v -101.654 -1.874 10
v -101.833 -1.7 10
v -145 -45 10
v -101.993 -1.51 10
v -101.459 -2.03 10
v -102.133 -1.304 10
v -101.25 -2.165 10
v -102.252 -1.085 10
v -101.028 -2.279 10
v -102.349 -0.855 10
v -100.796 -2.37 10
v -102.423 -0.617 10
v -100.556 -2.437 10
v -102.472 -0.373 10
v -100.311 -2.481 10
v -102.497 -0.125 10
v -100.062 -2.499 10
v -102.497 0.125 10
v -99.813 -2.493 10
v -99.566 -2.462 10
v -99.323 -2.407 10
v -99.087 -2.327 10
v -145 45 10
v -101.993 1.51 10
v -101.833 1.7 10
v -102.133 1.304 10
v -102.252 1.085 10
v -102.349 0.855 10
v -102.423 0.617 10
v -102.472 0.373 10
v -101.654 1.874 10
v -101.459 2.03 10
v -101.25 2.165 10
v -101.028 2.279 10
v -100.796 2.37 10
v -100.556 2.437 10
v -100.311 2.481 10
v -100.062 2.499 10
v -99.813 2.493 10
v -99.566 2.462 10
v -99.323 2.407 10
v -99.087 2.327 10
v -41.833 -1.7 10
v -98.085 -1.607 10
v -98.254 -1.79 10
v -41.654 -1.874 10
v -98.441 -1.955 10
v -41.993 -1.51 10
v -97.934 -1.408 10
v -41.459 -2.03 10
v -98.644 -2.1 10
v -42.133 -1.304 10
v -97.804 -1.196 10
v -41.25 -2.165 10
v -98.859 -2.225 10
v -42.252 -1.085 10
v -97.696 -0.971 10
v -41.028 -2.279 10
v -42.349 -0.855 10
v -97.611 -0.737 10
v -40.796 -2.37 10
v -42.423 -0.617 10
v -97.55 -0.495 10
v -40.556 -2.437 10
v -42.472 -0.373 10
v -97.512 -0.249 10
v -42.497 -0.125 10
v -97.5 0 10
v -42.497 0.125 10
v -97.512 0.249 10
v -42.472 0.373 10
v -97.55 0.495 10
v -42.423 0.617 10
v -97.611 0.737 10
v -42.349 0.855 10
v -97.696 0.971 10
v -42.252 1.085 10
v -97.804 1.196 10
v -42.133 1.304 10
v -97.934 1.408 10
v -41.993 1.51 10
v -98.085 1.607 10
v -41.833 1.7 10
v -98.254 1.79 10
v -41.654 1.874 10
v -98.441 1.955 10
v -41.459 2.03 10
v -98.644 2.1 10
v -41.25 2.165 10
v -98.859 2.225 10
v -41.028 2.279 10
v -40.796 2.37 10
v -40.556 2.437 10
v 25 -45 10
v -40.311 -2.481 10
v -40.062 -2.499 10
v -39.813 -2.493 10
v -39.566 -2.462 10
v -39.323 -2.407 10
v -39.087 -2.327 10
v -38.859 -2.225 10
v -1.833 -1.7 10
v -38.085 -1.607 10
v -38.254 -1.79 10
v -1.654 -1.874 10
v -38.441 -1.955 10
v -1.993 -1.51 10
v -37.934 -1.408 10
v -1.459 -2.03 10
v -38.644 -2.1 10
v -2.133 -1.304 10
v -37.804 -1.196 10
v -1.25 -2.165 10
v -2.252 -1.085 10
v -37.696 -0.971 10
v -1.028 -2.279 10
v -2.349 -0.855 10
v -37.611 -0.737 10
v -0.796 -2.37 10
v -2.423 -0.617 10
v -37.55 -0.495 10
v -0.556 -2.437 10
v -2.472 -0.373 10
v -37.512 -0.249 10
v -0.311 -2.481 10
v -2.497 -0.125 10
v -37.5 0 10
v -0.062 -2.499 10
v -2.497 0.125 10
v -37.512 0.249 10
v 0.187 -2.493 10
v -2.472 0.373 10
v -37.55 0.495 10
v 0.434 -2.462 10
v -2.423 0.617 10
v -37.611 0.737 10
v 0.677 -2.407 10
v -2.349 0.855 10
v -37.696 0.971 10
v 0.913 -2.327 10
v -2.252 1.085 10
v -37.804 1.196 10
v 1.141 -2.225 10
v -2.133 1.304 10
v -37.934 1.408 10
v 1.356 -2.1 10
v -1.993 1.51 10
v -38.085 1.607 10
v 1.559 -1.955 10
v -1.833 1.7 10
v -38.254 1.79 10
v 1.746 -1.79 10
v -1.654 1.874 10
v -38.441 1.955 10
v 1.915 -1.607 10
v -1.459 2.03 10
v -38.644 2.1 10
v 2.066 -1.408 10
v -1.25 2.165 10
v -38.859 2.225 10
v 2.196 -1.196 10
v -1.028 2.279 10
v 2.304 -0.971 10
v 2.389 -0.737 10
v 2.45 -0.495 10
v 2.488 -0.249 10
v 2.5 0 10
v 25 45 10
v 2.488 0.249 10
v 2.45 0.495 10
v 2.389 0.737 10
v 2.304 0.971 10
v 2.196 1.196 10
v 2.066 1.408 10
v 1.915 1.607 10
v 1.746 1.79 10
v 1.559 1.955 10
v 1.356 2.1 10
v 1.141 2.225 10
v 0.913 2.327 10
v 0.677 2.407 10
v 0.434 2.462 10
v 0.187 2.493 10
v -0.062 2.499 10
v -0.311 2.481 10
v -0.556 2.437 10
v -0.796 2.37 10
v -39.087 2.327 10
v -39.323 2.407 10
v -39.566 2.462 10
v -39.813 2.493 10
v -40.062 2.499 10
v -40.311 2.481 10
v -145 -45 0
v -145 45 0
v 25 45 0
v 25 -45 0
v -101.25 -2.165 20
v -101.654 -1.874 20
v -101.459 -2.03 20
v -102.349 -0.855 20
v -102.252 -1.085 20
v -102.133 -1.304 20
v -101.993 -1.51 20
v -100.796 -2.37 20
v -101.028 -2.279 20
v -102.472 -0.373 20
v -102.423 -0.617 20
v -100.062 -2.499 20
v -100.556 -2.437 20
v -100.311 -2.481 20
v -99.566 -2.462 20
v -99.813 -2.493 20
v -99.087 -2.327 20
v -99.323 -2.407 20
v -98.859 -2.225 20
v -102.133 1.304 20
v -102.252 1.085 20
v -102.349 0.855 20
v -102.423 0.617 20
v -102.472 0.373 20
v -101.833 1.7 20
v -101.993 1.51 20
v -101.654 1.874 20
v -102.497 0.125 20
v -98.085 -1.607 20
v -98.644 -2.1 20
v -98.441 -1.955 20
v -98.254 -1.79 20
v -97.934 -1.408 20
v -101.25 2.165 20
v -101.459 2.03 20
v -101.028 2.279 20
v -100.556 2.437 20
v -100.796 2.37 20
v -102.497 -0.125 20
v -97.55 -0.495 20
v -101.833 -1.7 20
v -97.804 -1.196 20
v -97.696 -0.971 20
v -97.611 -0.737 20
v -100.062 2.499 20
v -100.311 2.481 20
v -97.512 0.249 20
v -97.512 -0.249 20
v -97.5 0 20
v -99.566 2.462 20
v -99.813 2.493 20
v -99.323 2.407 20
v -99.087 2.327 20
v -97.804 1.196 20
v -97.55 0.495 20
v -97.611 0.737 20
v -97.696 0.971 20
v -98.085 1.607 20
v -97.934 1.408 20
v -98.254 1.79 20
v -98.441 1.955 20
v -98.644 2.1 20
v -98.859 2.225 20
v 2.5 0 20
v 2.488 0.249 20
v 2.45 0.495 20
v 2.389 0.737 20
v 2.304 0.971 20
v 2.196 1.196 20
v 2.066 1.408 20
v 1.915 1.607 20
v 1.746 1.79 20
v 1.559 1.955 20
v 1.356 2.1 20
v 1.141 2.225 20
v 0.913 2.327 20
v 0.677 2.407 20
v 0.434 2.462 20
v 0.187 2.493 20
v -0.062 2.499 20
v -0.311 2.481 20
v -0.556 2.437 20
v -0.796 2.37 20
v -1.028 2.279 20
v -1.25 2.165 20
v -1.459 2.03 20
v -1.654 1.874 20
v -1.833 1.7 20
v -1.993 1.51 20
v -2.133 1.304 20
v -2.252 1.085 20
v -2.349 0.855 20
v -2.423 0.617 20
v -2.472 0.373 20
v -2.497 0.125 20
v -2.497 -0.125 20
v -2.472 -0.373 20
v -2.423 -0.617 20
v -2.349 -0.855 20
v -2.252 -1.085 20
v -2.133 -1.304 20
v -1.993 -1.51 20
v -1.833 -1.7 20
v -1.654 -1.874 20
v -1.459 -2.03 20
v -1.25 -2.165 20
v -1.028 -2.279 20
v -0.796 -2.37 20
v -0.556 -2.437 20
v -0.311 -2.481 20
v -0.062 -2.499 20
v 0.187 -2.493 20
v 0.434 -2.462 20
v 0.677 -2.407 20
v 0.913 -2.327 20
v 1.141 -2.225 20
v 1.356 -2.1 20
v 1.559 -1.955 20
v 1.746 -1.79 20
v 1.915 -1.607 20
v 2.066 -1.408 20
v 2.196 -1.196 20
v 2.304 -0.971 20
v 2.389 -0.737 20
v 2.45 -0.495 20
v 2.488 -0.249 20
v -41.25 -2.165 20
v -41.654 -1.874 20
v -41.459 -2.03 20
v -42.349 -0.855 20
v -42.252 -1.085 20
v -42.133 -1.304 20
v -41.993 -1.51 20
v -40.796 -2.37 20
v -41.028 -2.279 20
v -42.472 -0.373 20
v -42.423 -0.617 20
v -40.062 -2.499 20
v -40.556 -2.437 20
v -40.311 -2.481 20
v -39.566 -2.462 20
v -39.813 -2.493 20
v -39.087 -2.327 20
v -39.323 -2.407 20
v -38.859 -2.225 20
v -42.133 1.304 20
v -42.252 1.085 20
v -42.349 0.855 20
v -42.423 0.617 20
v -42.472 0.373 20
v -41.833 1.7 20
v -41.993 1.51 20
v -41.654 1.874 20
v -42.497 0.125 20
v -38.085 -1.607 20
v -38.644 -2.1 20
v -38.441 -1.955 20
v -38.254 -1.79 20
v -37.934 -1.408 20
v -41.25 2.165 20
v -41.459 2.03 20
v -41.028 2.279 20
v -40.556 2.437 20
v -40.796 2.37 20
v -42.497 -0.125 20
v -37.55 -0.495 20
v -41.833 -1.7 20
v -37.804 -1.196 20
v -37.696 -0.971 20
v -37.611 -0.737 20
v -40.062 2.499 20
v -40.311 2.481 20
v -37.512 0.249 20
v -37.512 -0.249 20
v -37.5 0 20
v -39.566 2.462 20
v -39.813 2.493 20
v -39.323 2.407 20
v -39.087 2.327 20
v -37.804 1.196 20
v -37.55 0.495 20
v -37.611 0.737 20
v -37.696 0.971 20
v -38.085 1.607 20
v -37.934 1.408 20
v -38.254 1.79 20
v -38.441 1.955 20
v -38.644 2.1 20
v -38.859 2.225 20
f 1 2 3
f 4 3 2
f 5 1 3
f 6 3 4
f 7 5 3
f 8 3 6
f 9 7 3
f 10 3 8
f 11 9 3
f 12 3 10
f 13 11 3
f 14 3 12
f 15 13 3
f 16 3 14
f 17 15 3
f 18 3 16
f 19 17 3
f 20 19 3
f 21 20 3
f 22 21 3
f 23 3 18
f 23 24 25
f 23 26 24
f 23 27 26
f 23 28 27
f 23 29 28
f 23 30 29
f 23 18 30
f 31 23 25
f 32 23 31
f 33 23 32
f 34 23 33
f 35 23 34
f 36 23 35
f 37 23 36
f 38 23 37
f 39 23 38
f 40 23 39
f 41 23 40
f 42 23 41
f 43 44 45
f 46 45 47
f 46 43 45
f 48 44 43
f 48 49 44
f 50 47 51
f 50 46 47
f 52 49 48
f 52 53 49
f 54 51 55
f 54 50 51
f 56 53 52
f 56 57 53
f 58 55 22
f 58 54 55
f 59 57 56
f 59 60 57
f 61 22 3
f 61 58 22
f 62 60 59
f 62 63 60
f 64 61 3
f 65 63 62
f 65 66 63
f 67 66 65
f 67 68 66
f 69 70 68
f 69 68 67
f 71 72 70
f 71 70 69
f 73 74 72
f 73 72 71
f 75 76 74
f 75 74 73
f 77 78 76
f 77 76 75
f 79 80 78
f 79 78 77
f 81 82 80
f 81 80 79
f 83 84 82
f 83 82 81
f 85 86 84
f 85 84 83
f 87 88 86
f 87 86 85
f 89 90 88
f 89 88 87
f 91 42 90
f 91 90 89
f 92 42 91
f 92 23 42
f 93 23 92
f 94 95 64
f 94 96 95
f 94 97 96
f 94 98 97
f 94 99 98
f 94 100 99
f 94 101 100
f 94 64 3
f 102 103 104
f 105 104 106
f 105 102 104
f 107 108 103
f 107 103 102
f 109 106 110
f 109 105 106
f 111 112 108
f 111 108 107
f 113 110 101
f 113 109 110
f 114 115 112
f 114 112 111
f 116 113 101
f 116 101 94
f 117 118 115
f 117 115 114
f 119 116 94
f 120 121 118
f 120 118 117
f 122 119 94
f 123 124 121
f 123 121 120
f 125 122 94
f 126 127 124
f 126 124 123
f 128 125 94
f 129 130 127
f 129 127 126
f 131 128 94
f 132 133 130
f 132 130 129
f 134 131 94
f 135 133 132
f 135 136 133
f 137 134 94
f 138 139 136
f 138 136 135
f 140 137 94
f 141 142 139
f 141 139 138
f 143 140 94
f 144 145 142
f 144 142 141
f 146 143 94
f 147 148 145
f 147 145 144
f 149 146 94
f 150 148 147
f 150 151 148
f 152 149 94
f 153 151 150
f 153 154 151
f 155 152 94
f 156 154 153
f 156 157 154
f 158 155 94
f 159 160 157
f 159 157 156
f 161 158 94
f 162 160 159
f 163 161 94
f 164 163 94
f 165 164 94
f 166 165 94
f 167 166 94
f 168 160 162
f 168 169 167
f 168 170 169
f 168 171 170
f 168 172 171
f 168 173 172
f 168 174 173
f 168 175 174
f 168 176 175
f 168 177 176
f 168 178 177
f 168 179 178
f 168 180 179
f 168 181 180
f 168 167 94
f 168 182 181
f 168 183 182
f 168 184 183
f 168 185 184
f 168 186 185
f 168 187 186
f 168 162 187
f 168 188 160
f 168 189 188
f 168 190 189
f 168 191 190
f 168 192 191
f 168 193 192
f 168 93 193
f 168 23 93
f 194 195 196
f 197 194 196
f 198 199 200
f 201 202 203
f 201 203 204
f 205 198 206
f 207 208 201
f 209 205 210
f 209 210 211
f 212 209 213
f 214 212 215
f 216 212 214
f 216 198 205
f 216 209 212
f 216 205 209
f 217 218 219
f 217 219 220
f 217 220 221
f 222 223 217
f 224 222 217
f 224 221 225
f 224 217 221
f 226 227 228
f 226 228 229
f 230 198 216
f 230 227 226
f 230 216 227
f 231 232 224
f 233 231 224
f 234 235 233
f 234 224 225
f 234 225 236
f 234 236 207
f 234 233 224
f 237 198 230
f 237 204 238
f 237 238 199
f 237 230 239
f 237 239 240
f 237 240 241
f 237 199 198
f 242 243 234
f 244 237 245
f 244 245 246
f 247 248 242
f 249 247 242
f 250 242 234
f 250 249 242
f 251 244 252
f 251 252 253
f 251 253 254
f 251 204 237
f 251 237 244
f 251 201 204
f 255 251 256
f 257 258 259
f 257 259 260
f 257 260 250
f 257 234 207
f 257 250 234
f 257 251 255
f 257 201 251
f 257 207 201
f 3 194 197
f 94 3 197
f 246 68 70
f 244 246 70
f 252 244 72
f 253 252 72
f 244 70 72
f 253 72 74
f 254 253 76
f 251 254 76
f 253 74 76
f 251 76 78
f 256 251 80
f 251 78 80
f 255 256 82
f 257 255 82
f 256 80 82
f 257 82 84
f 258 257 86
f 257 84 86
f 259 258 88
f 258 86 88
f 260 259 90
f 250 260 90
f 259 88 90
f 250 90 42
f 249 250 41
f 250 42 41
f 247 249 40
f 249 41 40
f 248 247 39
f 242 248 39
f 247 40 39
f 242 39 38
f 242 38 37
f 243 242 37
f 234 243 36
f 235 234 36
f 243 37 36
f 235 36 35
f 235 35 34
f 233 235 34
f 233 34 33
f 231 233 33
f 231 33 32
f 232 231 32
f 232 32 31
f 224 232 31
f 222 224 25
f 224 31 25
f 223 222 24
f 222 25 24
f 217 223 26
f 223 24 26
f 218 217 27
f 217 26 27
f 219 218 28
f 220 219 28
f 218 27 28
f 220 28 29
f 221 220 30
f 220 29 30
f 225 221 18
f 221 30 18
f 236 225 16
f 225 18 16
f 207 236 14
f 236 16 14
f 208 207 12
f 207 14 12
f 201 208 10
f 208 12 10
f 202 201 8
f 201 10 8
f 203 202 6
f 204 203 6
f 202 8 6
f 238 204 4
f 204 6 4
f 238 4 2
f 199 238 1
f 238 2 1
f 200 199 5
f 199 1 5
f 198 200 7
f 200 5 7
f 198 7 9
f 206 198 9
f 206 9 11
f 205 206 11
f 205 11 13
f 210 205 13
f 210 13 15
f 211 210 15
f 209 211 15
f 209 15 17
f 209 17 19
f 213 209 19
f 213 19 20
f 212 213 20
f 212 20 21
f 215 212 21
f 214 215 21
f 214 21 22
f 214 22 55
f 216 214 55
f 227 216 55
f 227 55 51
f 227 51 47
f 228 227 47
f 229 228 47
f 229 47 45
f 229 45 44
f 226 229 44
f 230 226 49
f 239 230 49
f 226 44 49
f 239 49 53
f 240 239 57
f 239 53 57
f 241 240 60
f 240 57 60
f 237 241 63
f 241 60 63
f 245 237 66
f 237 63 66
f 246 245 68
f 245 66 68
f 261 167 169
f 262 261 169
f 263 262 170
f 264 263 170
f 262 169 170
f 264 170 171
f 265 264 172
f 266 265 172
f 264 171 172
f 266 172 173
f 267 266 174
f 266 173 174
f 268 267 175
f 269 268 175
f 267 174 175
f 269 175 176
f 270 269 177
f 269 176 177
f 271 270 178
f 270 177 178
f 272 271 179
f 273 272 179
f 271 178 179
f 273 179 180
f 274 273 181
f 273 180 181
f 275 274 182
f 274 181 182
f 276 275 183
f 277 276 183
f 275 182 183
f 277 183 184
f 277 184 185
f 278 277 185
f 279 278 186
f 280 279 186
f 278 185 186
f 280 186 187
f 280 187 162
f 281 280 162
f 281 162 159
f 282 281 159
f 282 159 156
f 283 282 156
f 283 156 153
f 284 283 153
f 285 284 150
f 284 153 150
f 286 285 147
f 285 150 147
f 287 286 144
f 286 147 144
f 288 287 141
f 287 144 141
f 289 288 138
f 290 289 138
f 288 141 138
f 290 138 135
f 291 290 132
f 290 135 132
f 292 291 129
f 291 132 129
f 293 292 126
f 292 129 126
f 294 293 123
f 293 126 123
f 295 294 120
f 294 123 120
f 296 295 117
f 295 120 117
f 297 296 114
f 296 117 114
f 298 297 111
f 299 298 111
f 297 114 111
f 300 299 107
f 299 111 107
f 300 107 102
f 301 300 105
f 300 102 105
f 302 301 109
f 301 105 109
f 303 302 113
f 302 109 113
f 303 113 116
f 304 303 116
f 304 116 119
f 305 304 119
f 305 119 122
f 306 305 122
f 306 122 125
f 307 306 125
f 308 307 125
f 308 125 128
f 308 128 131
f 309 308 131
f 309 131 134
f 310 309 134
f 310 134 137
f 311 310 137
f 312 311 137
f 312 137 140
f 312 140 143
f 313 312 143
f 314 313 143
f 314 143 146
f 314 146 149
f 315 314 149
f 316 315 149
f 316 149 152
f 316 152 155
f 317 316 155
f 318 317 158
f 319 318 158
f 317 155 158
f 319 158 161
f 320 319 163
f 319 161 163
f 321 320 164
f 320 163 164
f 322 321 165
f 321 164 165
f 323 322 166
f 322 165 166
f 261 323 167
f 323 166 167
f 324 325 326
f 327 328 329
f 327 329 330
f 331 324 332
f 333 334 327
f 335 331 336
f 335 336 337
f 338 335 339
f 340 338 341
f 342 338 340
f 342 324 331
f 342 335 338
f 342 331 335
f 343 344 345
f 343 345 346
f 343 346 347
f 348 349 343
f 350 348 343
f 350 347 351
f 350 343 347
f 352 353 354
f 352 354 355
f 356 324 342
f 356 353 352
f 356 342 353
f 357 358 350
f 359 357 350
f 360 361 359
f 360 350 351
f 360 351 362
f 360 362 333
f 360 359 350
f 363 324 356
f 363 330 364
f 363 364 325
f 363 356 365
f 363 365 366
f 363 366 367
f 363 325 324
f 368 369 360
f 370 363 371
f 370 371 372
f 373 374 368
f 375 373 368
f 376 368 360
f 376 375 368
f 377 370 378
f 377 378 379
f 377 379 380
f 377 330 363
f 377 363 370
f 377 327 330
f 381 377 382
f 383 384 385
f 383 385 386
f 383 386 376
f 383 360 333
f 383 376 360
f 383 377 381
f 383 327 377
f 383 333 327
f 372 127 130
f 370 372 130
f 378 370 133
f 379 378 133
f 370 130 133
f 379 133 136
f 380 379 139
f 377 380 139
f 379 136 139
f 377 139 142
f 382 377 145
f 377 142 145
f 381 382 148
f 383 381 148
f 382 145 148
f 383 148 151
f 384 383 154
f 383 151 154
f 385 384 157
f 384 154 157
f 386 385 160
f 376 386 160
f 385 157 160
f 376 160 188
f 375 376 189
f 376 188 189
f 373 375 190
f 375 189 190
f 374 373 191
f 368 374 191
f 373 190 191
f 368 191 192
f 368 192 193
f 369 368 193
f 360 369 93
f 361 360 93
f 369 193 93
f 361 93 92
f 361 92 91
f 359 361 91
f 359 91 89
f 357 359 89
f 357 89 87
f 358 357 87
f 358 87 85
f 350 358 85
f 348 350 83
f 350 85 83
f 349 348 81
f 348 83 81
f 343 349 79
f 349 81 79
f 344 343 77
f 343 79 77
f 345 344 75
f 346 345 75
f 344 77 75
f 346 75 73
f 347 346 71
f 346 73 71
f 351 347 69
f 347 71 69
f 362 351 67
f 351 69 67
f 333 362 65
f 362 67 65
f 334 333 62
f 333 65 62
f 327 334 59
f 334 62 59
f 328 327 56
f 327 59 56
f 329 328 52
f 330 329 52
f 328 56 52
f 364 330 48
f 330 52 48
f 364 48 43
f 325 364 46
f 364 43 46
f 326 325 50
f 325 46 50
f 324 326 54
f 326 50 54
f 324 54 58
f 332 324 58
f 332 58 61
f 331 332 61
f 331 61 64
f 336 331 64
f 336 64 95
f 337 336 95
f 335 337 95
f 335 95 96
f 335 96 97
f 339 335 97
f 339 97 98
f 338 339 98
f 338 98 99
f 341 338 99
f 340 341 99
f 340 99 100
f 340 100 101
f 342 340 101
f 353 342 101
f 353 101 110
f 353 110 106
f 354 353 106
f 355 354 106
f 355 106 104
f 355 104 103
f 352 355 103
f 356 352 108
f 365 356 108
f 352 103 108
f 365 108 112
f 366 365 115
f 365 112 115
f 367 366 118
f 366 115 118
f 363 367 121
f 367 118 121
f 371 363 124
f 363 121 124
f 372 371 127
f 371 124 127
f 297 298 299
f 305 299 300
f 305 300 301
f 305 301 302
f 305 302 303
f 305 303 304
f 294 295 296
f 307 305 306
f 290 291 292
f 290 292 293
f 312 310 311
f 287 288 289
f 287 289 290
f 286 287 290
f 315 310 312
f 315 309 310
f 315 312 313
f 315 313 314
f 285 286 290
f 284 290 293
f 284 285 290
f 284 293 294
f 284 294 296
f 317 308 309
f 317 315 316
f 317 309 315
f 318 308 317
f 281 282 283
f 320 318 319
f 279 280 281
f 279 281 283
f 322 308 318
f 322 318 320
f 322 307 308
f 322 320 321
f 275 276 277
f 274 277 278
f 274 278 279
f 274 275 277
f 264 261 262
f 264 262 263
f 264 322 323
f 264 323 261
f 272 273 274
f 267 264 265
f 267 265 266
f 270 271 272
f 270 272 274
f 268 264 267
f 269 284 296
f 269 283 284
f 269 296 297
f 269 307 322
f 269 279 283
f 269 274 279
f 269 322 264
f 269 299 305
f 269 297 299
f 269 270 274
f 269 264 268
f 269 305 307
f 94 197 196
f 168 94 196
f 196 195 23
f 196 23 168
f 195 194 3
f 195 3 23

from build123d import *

# Parameters (mm, degrees)
SKETCH_W     = 170
SKETCH_H     = 90
PAD_DEPTH    = 10
SKETCH001_R  = 2.5
PAD001_DEPTH = 10


with BuildPart() as part:
    # Sketch → Pad (new body)
    with BuildSketch(Plane.XY):
        with Locations((-60, 0)):
            Rectangle(SKETCH_W, SKETCH_H)
    extrude(amount=PAD_DEPTH)

    # Sketch001 (on Face6 of Pad) → Pad001 (join)
    with BuildSketch(Plane.XY.offset(10)):
        with Locations((-40, 0)):
            Circle(SKETCH001_R)
        Circle(SKETCH001_R)
        with Locations((-100, 0)):
            Circle(SKETCH001_R)
    extrude(amount=PAD001_DEPTH)


solid = part.part
